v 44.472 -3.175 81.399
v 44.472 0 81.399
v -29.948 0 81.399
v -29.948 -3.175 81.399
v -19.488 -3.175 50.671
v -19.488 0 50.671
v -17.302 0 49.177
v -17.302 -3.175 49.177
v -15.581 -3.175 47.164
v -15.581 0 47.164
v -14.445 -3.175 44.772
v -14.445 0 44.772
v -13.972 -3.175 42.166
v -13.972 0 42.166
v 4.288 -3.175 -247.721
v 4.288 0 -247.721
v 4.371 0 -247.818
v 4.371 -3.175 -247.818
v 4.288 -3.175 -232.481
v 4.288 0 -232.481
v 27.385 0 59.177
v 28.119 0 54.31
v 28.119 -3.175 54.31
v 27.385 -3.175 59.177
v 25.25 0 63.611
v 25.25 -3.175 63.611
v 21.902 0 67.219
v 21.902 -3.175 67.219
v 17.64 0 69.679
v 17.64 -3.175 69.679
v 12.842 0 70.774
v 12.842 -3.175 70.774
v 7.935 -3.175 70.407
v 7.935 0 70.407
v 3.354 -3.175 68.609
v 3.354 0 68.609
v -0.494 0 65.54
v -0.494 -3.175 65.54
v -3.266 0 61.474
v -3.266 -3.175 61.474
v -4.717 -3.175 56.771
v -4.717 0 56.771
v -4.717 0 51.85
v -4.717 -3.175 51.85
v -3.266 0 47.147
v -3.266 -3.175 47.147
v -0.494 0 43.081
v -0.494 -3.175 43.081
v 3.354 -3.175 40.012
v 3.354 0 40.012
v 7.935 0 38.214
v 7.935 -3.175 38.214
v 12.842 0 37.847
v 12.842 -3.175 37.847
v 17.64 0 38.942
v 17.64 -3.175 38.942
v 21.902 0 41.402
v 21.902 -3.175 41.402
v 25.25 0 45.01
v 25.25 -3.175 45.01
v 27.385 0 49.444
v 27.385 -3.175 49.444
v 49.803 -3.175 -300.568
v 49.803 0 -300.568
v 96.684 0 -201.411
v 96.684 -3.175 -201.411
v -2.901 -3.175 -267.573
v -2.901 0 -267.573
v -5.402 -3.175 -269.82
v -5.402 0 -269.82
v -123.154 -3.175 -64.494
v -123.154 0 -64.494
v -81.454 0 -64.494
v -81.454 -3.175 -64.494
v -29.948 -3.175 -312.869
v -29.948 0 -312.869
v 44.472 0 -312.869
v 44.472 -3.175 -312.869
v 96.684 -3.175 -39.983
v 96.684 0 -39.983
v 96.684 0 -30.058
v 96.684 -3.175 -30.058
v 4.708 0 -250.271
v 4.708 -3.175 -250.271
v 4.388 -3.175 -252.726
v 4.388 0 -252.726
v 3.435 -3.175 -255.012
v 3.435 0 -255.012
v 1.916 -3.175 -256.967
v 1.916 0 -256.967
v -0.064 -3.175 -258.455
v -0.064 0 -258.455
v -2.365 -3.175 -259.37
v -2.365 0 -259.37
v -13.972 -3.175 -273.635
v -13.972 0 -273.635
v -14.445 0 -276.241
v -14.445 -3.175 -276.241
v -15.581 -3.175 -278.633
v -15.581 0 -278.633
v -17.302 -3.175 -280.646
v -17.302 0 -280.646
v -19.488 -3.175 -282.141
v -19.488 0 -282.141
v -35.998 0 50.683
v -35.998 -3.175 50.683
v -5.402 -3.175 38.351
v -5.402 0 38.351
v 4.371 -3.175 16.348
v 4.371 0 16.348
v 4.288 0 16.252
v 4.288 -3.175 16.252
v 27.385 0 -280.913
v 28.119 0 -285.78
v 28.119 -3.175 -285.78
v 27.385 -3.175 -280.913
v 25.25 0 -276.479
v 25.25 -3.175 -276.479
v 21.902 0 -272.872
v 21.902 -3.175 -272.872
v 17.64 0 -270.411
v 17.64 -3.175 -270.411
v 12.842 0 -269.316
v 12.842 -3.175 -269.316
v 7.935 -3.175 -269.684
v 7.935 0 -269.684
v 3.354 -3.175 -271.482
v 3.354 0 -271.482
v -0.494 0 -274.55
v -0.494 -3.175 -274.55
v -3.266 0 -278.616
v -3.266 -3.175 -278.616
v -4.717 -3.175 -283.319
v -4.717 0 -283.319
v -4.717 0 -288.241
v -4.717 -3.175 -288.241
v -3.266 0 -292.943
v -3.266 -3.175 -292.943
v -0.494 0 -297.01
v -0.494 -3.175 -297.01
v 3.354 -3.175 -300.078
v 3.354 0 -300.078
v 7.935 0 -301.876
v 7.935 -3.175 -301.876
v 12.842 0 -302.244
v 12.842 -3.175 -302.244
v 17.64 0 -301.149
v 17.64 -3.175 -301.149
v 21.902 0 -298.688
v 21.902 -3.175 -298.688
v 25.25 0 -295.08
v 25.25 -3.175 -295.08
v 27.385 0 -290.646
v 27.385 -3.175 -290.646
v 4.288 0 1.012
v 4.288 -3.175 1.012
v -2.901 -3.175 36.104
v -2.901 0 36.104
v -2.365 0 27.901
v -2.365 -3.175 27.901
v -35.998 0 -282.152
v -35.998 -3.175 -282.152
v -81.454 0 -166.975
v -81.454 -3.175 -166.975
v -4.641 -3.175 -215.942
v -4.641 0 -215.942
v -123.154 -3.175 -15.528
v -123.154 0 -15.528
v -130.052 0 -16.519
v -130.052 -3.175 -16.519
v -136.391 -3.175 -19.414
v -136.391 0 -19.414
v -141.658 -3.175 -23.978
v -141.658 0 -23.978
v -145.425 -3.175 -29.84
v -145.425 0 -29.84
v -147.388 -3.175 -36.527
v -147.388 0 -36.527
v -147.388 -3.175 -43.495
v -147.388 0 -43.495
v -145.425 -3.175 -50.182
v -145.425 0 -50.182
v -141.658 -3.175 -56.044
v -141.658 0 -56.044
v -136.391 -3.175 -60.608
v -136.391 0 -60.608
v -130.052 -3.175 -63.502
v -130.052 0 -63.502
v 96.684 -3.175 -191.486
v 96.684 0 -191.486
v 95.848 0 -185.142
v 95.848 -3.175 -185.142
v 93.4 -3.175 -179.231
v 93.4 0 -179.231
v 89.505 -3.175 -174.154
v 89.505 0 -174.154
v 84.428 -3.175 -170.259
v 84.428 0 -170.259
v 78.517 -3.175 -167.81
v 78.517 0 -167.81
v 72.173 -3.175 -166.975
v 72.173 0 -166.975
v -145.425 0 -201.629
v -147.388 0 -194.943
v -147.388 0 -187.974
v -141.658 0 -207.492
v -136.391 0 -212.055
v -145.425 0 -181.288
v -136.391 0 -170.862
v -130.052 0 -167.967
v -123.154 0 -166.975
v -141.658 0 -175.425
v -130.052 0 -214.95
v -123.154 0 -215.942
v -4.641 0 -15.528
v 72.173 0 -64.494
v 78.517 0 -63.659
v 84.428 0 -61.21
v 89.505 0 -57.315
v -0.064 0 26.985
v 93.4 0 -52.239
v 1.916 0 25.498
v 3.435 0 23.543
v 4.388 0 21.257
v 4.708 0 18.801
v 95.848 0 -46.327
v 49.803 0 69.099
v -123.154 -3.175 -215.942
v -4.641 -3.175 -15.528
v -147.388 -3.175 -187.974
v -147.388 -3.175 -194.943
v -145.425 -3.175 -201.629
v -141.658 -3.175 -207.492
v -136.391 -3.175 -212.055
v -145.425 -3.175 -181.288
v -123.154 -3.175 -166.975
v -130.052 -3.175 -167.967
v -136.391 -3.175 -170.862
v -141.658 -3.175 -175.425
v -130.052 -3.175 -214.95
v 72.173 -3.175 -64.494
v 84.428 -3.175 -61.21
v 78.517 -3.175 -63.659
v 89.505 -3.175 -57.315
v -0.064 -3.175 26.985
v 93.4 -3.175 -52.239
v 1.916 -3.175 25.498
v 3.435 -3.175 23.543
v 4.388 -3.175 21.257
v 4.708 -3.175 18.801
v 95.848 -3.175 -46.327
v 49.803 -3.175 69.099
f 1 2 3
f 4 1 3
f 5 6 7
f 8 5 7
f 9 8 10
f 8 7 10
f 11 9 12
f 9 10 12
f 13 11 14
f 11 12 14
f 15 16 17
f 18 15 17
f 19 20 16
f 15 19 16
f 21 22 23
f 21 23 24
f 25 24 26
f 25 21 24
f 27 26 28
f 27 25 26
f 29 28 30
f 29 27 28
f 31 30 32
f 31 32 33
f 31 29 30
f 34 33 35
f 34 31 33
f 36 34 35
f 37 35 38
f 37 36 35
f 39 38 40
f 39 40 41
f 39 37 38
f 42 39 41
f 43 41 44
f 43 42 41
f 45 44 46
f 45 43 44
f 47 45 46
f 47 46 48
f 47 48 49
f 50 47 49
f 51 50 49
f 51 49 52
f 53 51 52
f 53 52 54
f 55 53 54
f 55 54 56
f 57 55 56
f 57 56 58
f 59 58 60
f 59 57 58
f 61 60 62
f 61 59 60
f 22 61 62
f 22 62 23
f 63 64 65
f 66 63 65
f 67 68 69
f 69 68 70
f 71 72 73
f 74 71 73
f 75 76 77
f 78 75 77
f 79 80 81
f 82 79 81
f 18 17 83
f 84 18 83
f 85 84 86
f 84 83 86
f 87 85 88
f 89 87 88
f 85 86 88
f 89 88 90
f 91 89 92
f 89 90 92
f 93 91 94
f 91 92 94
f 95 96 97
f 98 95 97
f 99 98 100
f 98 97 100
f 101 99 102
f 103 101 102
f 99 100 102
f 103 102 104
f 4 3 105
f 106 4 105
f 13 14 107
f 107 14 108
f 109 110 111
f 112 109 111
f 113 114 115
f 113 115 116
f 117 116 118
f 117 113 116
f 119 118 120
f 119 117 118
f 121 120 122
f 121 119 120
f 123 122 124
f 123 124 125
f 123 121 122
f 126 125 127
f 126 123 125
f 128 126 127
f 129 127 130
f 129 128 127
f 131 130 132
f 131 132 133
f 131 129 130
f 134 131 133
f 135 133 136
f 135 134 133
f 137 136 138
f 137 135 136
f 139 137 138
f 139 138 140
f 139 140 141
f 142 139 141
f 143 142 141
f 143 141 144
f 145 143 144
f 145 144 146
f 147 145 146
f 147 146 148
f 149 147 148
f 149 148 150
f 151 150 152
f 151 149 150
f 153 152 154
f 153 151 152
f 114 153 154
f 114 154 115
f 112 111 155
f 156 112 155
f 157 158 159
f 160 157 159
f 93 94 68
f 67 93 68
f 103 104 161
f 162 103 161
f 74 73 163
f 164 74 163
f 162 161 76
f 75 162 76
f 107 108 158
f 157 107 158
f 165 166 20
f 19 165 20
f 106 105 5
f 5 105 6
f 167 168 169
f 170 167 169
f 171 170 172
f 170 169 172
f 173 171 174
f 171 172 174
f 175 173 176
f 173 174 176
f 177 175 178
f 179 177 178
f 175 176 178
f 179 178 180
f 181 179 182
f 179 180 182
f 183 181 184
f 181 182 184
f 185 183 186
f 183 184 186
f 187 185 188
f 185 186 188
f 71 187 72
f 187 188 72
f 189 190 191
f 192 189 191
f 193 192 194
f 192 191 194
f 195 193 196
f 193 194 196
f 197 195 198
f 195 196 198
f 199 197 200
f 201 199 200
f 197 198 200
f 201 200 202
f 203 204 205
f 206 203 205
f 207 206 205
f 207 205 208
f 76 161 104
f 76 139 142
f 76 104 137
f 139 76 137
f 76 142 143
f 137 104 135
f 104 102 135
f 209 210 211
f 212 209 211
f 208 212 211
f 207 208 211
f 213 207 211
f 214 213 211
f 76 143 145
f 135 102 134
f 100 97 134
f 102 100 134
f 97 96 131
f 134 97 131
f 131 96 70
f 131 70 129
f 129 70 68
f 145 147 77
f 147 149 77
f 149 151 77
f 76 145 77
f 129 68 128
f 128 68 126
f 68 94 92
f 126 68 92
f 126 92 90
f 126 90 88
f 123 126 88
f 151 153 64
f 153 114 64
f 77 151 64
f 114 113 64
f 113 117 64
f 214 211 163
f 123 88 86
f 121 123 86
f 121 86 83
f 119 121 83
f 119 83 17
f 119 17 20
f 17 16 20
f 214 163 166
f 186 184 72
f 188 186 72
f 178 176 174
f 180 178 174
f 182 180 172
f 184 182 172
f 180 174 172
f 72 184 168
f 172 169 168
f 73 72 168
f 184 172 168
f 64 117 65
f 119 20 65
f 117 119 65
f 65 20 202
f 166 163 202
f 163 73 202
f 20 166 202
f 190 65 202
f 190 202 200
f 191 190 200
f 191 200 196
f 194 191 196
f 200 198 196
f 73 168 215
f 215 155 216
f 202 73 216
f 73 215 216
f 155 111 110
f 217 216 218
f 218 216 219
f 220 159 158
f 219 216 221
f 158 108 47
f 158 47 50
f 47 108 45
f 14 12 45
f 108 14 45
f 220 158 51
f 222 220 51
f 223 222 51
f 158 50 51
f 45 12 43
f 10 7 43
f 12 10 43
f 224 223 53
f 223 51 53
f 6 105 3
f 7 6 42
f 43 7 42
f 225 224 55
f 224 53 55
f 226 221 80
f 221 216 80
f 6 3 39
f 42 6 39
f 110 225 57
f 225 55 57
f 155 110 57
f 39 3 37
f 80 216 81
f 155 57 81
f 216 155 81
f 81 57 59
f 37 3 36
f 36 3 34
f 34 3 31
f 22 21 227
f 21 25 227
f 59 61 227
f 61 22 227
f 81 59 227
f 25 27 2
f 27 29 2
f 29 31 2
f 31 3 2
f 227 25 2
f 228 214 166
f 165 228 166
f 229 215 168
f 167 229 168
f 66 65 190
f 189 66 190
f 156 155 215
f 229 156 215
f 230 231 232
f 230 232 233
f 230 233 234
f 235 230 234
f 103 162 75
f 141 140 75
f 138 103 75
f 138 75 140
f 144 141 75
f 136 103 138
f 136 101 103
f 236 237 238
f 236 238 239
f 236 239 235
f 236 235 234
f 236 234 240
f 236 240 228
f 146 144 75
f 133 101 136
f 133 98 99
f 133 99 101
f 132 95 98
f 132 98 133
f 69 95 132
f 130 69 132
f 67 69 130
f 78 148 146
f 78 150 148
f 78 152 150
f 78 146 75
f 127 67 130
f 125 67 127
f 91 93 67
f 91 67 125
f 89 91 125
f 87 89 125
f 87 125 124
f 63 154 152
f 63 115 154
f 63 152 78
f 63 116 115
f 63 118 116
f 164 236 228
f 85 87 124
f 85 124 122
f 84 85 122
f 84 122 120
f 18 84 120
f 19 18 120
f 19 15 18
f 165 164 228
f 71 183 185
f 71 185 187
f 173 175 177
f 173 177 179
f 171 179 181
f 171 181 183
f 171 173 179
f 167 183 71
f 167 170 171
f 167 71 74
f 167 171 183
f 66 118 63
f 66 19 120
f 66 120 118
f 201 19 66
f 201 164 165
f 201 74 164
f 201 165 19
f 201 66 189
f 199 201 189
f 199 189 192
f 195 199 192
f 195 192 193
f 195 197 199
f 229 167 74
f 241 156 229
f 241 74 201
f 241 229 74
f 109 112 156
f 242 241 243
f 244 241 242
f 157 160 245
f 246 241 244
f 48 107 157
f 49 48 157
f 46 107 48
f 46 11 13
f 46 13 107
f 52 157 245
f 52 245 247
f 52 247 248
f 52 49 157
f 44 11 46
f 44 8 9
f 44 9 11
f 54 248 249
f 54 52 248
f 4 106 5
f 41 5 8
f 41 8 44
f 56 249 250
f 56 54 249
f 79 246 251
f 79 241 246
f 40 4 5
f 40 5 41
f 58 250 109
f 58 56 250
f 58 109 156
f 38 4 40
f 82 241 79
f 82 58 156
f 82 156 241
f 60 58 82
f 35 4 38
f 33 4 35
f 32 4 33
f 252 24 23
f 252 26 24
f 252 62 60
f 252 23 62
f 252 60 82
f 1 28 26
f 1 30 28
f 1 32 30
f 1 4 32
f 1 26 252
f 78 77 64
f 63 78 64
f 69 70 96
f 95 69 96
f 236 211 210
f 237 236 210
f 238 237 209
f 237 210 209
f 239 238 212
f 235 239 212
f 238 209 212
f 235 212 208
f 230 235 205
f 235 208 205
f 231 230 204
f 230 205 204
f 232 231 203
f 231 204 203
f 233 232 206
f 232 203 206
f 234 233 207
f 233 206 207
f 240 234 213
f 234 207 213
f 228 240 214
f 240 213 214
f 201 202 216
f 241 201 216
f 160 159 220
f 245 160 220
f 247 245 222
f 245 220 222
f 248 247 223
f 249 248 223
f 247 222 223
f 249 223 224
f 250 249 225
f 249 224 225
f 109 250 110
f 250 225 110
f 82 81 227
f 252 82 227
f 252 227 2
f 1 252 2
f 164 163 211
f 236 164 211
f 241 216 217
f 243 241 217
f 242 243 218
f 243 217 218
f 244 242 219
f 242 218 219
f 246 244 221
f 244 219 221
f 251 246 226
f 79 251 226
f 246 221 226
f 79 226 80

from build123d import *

# Parameters (mm, degrees)
F0_R     = 16.51
F1_DEPTH = 3.175


# Not quite as in the source:
# - ends of sketch curves that miss each other by under 0.0002 mm in the source are joined
# - a feature names something its author has since deleted; it is built from what else it names


with BuildPart() as f1:
    # F0 (on Front) → F1 (new body)
    with BuildSketch(Plane.XZ):
        with BuildLine():
            Line((72.172606051, -154.628444229), (72.172606051, -76.840944229))
            Line((72.172606051, -76.840944229), (72.172606051, -64.494198626))
            ThreePointArc((72.172606051, -64.494198626), (89.5045003647, -57.3150929397), (96.683606051, -39.983198626))
            Line((96.683606051, -39.983198626), (96.683606051, -30.0584486086))
            Line((96.683606051, -30.0584486086), (49.8026024117, 69.0988139849))
            Line((49.8026024117, 69.0988139849), (44.4719158113, 81.3992435336))
            Line((44.4719158113, 81.3992435336), (-29.9480052508, 81.3992435336))
            Line((-29.9480052508, 81.3992435336), (-35.9978974571, 50.6829957967))
            Line((-35.9978974571, 50.6829957967), (-19.4879078689, 50.6714224456))
            ThreePointArc((-19.4879078689, 50.6714224456), (-15.5812211009, 47.1637298884), (-13.9720730804, 42.1660573792))
            Line((-13.9720730804, 42.1660573792), (-5.4024819992, 38.3506346508))
            Line((-5.4024819992, 38.3506346508), (-2.9009456417, 36.1038269705))
            Line((-2.9009456417, 36.1038269705), (-2.3647786124, 27.9011076368))
            ThreePointArc((-2.3647786124, 27.9011076368), (3.4353485173, 23.5426794776), (4.3712937617, 16.3481414632))
            Line((4.3712937617, 16.3481414632), (4.2880811809, 16.2515226396))
            Line((4.2880811809, 16.2515226396), (4.2880776677, 1.0115236557))
            Line((4.2880776677, 1.0115236557), (-4.6405893252, -15.5276898319))
            Line((-4.6405893252, -15.5276898319), (-123.1544493252, -15.5276898319))
            ThreePointArc((-123.1544493252, -15.5276898319), (-147.6377037222, -40.010944229), (-123.1544493252, -64.494198626))
            Line((-123.1544493252, -64.494198626), (-81.4537847014, -64.494198626))
            Line((-81.4537847014, -64.494198626), (-81.4537847014, -76.840944229))
            Line((-81.4537847014, -76.840944229), (-81.4537847014, -154.628444229))
            Line((-81.4537847014, -154.628444229), (-81.4537847014, -166.9751898319))
            Line((-81.4537847014, -166.9751898319), (-123.1544493252, -166.9751898319))
            ThreePointArc((-123.1544493252, -166.9751898319), (-147.6377037222, -191.458444229), (-123.1544493252, -215.941698626))
            Line((-123.1544493252, -215.941698626), (-4.6405893252, -215.941698626))
            Line((-4.6405893252, -215.941698626), (4.2880776677, -232.4809121137))
            Line((4.2880776677, -232.4809121137), (4.2880811809, -247.7209110976))
            Line((4.2880811809, -247.7209110976), (4.3712937617, -247.8175299212))
            ThreePointArc((4.3712937617, -247.8175299212), (3.4353485173, -255.0120679356), (-2.3647786124, -259.3704960948))
            Line((-2.3647786124, -259.3704960948), (-2.9009456417, -267.5732154285))
            Line((-2.9009456417, -267.5732154285), (-5.4024819992, -269.8200231088))
            Line((-5.4024819992, -269.8200231088), (-13.9720735102, -273.6354510709))
            ThreePointArc((-13.9720735102, -273.6354510709), (-15.5812211009, -278.6331183464), (-19.487905219, -282.1408109018))
            Line((-19.487905219, -282.1408109018), (-35.9978974571, -282.1523842547))
            Line((-35.9978974571, -282.1523842547), (-29.9480052508, -312.8686319916))
            Line((-29.9480052508, -312.8686319916), (44.4719158113, -312.8686319916))
            Line((44.4719158113, -312.8686319916), (49.8026024117, -300.5682024429))
            Line((49.8026024117, -300.5682024429), (96.683606051, -201.4109398494))
            Line((96.683606051, -201.4109398494), (96.683606051, -191.4861898319))
            ThreePointArc((96.683606051, -191.4861898319), (89.5045003647, -174.1542955183), (72.172606051, -166.9751898319))
            Line((72.172606051, -166.9751898319), (72.172606051, -154.628444229))
        make_face()
        with Locations((11.6086210255, -285.7798588113)):
            Circle(F0_R, mode=Mode.SUBTRACT)
        with Locations((11.6086210255, 54.3104703533)):
            Circle(F0_R, mode=Mode.SUBTRACT)
    extrude(amount=F1_DEPTH)


solid = f1.part
